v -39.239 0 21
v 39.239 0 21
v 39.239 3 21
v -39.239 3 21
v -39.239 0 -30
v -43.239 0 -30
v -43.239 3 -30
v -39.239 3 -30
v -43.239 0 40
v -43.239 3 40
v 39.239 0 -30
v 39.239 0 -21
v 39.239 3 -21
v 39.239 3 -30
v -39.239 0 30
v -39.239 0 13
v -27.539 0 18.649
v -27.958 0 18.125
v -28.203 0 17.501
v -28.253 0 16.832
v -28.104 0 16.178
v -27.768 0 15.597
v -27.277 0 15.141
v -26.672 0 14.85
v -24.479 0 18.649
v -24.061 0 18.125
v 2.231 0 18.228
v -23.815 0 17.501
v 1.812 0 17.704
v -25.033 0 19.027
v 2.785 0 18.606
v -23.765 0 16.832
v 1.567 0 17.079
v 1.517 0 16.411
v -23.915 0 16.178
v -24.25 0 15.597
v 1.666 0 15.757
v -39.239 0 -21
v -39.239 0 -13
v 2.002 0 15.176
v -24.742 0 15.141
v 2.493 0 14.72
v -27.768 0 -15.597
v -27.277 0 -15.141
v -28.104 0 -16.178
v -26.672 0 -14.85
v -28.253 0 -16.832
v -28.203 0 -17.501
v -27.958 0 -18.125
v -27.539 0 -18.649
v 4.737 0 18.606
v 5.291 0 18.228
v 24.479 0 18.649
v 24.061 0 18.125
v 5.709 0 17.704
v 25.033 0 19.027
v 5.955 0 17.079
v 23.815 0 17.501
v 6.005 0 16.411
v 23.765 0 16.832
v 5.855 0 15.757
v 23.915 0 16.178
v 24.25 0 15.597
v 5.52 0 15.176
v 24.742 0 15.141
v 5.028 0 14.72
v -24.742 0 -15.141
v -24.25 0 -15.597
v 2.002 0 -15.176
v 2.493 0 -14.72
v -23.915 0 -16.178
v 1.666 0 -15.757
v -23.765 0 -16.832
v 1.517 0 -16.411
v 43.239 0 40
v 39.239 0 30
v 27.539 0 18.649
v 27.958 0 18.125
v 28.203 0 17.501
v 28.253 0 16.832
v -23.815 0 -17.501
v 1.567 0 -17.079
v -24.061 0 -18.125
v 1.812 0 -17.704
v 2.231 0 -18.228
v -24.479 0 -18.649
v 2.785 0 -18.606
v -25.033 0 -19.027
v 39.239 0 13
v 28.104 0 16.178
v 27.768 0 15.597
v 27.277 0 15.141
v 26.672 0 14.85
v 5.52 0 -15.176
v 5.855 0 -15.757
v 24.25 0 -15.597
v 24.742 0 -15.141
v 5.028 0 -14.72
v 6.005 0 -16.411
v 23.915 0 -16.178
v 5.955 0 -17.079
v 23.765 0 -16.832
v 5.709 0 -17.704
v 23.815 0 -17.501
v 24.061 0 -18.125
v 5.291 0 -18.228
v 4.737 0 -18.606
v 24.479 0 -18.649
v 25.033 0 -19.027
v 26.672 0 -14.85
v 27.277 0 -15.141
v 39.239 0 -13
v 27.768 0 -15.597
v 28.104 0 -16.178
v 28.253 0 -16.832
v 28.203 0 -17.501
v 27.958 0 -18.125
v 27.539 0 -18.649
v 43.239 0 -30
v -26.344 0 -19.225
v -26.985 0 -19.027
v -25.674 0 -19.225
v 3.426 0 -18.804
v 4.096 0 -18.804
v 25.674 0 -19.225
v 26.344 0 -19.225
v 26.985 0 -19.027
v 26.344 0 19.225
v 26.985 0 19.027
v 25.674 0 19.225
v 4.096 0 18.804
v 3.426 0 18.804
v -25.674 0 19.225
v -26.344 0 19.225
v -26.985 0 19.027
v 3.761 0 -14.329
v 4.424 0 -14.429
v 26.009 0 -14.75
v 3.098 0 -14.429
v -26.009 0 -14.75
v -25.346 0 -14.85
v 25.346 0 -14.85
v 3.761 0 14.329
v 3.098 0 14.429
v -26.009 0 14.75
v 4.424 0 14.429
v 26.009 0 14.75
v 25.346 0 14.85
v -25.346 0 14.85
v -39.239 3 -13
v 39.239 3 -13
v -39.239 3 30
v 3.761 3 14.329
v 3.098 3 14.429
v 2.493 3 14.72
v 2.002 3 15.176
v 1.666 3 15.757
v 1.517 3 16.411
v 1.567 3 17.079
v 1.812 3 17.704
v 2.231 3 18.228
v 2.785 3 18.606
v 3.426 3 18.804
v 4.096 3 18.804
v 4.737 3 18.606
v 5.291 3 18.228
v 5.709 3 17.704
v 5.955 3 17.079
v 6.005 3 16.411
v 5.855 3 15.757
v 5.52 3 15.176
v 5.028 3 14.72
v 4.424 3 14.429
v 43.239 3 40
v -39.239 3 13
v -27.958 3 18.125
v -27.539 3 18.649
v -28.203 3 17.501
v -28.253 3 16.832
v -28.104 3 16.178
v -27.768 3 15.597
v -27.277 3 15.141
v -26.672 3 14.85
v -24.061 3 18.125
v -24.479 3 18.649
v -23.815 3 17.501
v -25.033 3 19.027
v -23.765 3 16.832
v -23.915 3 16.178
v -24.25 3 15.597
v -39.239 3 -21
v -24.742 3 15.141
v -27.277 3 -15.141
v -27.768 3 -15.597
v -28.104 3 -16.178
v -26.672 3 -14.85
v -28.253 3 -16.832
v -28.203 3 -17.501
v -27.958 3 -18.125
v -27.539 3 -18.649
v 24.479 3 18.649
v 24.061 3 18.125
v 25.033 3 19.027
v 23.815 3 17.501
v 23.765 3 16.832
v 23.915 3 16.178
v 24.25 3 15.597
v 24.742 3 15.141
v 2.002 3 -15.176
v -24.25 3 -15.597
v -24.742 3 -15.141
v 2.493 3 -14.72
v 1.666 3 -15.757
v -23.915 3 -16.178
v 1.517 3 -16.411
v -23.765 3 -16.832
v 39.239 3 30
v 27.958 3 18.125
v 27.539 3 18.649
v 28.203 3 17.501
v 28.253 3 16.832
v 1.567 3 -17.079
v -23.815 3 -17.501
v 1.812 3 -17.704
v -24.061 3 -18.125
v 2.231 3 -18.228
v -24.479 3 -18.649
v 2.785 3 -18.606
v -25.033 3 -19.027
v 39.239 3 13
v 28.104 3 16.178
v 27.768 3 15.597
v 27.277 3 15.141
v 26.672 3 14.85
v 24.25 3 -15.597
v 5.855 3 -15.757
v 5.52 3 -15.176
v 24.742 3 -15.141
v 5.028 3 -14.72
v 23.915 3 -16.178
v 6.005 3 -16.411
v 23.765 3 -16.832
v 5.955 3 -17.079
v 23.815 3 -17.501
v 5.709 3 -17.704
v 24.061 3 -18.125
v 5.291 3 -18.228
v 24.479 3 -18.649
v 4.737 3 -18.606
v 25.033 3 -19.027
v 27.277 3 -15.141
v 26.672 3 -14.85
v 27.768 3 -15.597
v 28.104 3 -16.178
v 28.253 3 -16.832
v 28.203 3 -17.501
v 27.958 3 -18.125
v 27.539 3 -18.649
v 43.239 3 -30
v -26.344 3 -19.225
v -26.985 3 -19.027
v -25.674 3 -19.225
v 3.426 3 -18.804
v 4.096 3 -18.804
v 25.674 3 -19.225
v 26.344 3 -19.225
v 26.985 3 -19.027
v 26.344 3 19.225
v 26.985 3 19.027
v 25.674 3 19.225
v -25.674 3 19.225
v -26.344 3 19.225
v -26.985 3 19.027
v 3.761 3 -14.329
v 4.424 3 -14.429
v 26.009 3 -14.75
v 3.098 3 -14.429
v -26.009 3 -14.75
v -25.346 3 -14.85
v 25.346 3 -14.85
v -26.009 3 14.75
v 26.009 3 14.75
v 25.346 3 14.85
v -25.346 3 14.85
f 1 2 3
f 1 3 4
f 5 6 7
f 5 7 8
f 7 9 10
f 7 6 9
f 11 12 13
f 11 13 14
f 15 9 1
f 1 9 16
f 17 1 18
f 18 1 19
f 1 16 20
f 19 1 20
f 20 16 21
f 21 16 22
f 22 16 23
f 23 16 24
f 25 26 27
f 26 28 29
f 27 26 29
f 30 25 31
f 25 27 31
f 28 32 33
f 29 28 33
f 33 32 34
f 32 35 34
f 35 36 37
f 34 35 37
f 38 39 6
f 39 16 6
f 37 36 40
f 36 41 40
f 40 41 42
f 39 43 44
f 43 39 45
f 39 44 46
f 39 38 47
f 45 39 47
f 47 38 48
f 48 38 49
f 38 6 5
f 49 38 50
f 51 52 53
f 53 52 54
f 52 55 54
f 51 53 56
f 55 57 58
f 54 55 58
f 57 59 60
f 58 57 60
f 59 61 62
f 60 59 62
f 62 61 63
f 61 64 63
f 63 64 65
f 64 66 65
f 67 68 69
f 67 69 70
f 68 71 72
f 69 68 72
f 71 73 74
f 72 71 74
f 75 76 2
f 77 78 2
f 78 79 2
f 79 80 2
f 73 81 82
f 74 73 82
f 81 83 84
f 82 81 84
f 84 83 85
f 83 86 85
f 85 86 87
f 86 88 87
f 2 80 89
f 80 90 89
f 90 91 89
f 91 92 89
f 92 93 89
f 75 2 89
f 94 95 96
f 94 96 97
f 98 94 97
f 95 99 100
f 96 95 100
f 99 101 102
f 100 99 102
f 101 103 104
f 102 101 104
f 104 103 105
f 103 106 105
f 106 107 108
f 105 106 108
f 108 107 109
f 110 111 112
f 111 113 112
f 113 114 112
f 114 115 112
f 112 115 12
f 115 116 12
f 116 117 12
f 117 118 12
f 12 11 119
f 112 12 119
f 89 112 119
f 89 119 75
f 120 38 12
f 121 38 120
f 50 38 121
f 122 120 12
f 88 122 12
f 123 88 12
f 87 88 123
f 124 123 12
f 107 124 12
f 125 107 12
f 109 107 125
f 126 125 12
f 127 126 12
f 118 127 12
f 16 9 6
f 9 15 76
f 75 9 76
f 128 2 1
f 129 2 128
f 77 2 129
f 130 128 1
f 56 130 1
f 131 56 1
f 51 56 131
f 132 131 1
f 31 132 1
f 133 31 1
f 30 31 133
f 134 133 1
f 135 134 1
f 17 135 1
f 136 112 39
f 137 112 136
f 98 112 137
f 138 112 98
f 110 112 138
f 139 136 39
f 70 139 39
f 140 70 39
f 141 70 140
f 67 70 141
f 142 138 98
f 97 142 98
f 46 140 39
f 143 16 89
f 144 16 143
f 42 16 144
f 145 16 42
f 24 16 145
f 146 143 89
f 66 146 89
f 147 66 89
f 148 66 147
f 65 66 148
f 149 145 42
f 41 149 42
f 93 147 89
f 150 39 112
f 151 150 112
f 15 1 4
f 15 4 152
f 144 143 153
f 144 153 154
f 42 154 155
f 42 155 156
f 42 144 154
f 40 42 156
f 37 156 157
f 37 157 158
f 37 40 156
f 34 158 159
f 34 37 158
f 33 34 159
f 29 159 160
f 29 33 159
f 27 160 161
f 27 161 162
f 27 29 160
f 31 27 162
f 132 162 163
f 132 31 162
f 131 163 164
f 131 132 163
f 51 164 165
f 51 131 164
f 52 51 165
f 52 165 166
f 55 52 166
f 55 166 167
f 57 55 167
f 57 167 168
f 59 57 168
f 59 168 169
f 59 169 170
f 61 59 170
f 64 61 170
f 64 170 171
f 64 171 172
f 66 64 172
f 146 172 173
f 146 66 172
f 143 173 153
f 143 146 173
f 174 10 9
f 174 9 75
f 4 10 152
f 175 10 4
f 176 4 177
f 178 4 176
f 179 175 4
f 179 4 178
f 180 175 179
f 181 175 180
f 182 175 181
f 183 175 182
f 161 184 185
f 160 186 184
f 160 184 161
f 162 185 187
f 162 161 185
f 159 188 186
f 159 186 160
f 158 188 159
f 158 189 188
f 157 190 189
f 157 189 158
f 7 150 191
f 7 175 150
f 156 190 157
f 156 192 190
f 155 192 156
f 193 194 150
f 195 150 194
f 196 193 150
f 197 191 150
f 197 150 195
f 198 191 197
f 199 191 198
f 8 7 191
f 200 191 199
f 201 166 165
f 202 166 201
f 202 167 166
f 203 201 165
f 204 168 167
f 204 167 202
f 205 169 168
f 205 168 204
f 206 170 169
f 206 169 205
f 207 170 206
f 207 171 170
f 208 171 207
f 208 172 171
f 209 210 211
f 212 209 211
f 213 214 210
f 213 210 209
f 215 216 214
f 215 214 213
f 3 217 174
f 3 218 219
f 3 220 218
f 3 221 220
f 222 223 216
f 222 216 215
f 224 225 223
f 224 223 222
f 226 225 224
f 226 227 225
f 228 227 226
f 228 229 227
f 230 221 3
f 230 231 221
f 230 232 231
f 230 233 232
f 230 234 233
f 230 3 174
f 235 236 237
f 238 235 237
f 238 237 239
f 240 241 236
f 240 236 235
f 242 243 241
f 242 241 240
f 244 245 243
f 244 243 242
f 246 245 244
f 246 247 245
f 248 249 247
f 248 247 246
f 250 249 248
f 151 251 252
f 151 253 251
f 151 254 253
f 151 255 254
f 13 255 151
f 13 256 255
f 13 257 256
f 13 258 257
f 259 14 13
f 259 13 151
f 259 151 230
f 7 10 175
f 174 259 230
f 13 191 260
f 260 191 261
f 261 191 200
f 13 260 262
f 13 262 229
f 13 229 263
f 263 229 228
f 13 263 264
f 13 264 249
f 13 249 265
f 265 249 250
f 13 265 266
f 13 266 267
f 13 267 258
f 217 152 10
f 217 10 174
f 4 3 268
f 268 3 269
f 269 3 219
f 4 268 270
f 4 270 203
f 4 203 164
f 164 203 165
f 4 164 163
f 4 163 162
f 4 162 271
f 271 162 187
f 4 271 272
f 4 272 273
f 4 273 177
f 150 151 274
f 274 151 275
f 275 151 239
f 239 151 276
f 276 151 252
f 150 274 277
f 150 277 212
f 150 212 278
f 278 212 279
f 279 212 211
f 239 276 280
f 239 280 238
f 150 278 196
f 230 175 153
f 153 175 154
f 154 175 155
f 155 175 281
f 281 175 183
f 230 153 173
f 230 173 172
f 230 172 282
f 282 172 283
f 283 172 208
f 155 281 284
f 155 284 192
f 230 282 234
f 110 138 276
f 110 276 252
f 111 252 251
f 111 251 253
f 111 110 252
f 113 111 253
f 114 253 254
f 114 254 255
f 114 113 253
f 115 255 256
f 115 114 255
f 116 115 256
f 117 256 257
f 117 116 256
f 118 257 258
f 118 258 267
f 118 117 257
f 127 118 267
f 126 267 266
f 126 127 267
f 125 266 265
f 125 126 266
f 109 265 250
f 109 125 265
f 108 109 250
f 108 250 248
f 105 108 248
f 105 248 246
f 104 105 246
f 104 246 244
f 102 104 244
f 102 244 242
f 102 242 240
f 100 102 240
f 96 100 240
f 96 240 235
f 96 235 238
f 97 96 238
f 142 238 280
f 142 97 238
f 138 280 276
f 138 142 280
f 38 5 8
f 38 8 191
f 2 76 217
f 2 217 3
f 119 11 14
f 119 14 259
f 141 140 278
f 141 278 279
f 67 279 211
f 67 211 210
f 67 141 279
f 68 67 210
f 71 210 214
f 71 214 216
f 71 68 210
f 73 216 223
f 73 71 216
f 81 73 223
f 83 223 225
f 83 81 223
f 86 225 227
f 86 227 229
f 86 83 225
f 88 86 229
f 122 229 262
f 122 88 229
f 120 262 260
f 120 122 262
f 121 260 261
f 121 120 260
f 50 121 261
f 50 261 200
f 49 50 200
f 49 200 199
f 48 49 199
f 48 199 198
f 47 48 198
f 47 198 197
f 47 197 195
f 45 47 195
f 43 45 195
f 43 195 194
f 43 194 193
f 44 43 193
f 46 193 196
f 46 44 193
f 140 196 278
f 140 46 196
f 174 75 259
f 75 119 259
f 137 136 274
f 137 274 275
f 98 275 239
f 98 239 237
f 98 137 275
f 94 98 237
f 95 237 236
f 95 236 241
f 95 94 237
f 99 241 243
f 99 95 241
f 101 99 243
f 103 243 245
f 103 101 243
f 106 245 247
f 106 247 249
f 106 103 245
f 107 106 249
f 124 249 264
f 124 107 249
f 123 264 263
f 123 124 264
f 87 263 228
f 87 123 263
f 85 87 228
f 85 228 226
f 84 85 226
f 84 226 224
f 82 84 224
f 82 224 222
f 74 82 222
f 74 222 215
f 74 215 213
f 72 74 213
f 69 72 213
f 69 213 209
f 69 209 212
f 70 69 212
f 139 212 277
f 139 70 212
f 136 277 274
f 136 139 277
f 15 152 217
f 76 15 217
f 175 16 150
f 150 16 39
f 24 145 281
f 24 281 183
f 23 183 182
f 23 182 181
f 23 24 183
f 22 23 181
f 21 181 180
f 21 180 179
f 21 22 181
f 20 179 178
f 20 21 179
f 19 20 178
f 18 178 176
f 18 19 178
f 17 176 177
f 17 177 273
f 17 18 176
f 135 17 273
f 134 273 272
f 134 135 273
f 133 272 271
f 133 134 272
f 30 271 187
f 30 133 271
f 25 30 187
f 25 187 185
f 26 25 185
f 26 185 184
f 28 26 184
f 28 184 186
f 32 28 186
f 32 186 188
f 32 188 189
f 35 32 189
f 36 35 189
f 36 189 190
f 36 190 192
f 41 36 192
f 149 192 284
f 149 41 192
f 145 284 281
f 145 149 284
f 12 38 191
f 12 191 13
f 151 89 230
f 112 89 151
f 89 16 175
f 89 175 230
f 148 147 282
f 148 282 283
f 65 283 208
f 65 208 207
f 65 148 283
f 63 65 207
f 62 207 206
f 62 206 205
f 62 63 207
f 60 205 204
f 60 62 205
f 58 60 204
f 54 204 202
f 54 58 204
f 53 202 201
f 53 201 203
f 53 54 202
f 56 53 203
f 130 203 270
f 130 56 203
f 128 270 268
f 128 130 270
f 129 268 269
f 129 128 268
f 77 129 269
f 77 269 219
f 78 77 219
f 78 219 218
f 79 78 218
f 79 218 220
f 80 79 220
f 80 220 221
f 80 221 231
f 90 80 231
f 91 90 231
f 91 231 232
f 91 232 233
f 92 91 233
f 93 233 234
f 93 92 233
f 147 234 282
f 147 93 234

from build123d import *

# Parameters (mm, degrees)
SKETCH3_R           = 2.25
SKETCH3_W           = 78.47813411
SKETCH3_H           = 26
BOSS_EXTRUDE1_DEPTH = 3
SKETCH4_W           = 86.47813411
SKETCH4_H           = 3
BOSS_EXTRUDE2_DEPTH = 10


with BuildPart() as part:
    # Sketch3 → Boss-Extrude1 (new body)
    with BuildSketch(Plane(origin=(0, 0, 0), x_dir=(1, 0, 0), z_dir=(0, 1, 0))):
        Polygon((-43.239067055, -30), (-43.239067055, 30), (-39.239067055, 30), (-39.239067055, 21), (39.239067055, 21), (39.239067055, 30), (43.239067055, 30), (43.239067055, -30), (39.239067055, -30), (39.239067055, -21), (-39.239067055, -21), (-39.239067055, -30), align=None)
        with Locations(Location((-26.009067055, 17, 0), (0, 0, 270))):
            Circle(SKETCH3_R, mode=Mode.SUBTRACT)
        with Locations(Location((3.760932945, 16.578763023, 0), (0, 0, 270))):
            Circle(SKETCH3_R, mode=Mode.SUBTRACT)
        with Locations(Location((26.009067055, 17, 0), (0, 0, 270))):
            Circle(SKETCH3_R, mode=Mode.SUBTRACT)
        with Locations(Location((26.009067055, -17, 0), (0, 0, 90))):
            Circle(SKETCH3_R, mode=Mode.SUBTRACT)
        with Locations(Location((3.760932945, -16.578763023, 0), (0, 0, 90))):
            Circle(SKETCH3_R, mode=Mode.SUBTRACT)
        with Locations(Location((-26.009067055, -17, 0), (0, 0, 90))):
            Circle(SKETCH3_R, mode=Mode.SUBTRACT)
        Rectangle(SKETCH3_W, SKETCH3_H, mode=Mode.SUBTRACT)
    extrude(amount=BOSS_EXTRUDE1_DEPTH)

    # Sketch4 → Boss-Extrude2 (add)
    with BuildSketch(Plane.XY.offset(30)):
        with Locations((0, 1.5)):
            Rectangle(SKETCH4_W, SKETCH4_H)
    extrude(amount=BOSS_EXTRUDE2_DEPTH)


solid = part.part
